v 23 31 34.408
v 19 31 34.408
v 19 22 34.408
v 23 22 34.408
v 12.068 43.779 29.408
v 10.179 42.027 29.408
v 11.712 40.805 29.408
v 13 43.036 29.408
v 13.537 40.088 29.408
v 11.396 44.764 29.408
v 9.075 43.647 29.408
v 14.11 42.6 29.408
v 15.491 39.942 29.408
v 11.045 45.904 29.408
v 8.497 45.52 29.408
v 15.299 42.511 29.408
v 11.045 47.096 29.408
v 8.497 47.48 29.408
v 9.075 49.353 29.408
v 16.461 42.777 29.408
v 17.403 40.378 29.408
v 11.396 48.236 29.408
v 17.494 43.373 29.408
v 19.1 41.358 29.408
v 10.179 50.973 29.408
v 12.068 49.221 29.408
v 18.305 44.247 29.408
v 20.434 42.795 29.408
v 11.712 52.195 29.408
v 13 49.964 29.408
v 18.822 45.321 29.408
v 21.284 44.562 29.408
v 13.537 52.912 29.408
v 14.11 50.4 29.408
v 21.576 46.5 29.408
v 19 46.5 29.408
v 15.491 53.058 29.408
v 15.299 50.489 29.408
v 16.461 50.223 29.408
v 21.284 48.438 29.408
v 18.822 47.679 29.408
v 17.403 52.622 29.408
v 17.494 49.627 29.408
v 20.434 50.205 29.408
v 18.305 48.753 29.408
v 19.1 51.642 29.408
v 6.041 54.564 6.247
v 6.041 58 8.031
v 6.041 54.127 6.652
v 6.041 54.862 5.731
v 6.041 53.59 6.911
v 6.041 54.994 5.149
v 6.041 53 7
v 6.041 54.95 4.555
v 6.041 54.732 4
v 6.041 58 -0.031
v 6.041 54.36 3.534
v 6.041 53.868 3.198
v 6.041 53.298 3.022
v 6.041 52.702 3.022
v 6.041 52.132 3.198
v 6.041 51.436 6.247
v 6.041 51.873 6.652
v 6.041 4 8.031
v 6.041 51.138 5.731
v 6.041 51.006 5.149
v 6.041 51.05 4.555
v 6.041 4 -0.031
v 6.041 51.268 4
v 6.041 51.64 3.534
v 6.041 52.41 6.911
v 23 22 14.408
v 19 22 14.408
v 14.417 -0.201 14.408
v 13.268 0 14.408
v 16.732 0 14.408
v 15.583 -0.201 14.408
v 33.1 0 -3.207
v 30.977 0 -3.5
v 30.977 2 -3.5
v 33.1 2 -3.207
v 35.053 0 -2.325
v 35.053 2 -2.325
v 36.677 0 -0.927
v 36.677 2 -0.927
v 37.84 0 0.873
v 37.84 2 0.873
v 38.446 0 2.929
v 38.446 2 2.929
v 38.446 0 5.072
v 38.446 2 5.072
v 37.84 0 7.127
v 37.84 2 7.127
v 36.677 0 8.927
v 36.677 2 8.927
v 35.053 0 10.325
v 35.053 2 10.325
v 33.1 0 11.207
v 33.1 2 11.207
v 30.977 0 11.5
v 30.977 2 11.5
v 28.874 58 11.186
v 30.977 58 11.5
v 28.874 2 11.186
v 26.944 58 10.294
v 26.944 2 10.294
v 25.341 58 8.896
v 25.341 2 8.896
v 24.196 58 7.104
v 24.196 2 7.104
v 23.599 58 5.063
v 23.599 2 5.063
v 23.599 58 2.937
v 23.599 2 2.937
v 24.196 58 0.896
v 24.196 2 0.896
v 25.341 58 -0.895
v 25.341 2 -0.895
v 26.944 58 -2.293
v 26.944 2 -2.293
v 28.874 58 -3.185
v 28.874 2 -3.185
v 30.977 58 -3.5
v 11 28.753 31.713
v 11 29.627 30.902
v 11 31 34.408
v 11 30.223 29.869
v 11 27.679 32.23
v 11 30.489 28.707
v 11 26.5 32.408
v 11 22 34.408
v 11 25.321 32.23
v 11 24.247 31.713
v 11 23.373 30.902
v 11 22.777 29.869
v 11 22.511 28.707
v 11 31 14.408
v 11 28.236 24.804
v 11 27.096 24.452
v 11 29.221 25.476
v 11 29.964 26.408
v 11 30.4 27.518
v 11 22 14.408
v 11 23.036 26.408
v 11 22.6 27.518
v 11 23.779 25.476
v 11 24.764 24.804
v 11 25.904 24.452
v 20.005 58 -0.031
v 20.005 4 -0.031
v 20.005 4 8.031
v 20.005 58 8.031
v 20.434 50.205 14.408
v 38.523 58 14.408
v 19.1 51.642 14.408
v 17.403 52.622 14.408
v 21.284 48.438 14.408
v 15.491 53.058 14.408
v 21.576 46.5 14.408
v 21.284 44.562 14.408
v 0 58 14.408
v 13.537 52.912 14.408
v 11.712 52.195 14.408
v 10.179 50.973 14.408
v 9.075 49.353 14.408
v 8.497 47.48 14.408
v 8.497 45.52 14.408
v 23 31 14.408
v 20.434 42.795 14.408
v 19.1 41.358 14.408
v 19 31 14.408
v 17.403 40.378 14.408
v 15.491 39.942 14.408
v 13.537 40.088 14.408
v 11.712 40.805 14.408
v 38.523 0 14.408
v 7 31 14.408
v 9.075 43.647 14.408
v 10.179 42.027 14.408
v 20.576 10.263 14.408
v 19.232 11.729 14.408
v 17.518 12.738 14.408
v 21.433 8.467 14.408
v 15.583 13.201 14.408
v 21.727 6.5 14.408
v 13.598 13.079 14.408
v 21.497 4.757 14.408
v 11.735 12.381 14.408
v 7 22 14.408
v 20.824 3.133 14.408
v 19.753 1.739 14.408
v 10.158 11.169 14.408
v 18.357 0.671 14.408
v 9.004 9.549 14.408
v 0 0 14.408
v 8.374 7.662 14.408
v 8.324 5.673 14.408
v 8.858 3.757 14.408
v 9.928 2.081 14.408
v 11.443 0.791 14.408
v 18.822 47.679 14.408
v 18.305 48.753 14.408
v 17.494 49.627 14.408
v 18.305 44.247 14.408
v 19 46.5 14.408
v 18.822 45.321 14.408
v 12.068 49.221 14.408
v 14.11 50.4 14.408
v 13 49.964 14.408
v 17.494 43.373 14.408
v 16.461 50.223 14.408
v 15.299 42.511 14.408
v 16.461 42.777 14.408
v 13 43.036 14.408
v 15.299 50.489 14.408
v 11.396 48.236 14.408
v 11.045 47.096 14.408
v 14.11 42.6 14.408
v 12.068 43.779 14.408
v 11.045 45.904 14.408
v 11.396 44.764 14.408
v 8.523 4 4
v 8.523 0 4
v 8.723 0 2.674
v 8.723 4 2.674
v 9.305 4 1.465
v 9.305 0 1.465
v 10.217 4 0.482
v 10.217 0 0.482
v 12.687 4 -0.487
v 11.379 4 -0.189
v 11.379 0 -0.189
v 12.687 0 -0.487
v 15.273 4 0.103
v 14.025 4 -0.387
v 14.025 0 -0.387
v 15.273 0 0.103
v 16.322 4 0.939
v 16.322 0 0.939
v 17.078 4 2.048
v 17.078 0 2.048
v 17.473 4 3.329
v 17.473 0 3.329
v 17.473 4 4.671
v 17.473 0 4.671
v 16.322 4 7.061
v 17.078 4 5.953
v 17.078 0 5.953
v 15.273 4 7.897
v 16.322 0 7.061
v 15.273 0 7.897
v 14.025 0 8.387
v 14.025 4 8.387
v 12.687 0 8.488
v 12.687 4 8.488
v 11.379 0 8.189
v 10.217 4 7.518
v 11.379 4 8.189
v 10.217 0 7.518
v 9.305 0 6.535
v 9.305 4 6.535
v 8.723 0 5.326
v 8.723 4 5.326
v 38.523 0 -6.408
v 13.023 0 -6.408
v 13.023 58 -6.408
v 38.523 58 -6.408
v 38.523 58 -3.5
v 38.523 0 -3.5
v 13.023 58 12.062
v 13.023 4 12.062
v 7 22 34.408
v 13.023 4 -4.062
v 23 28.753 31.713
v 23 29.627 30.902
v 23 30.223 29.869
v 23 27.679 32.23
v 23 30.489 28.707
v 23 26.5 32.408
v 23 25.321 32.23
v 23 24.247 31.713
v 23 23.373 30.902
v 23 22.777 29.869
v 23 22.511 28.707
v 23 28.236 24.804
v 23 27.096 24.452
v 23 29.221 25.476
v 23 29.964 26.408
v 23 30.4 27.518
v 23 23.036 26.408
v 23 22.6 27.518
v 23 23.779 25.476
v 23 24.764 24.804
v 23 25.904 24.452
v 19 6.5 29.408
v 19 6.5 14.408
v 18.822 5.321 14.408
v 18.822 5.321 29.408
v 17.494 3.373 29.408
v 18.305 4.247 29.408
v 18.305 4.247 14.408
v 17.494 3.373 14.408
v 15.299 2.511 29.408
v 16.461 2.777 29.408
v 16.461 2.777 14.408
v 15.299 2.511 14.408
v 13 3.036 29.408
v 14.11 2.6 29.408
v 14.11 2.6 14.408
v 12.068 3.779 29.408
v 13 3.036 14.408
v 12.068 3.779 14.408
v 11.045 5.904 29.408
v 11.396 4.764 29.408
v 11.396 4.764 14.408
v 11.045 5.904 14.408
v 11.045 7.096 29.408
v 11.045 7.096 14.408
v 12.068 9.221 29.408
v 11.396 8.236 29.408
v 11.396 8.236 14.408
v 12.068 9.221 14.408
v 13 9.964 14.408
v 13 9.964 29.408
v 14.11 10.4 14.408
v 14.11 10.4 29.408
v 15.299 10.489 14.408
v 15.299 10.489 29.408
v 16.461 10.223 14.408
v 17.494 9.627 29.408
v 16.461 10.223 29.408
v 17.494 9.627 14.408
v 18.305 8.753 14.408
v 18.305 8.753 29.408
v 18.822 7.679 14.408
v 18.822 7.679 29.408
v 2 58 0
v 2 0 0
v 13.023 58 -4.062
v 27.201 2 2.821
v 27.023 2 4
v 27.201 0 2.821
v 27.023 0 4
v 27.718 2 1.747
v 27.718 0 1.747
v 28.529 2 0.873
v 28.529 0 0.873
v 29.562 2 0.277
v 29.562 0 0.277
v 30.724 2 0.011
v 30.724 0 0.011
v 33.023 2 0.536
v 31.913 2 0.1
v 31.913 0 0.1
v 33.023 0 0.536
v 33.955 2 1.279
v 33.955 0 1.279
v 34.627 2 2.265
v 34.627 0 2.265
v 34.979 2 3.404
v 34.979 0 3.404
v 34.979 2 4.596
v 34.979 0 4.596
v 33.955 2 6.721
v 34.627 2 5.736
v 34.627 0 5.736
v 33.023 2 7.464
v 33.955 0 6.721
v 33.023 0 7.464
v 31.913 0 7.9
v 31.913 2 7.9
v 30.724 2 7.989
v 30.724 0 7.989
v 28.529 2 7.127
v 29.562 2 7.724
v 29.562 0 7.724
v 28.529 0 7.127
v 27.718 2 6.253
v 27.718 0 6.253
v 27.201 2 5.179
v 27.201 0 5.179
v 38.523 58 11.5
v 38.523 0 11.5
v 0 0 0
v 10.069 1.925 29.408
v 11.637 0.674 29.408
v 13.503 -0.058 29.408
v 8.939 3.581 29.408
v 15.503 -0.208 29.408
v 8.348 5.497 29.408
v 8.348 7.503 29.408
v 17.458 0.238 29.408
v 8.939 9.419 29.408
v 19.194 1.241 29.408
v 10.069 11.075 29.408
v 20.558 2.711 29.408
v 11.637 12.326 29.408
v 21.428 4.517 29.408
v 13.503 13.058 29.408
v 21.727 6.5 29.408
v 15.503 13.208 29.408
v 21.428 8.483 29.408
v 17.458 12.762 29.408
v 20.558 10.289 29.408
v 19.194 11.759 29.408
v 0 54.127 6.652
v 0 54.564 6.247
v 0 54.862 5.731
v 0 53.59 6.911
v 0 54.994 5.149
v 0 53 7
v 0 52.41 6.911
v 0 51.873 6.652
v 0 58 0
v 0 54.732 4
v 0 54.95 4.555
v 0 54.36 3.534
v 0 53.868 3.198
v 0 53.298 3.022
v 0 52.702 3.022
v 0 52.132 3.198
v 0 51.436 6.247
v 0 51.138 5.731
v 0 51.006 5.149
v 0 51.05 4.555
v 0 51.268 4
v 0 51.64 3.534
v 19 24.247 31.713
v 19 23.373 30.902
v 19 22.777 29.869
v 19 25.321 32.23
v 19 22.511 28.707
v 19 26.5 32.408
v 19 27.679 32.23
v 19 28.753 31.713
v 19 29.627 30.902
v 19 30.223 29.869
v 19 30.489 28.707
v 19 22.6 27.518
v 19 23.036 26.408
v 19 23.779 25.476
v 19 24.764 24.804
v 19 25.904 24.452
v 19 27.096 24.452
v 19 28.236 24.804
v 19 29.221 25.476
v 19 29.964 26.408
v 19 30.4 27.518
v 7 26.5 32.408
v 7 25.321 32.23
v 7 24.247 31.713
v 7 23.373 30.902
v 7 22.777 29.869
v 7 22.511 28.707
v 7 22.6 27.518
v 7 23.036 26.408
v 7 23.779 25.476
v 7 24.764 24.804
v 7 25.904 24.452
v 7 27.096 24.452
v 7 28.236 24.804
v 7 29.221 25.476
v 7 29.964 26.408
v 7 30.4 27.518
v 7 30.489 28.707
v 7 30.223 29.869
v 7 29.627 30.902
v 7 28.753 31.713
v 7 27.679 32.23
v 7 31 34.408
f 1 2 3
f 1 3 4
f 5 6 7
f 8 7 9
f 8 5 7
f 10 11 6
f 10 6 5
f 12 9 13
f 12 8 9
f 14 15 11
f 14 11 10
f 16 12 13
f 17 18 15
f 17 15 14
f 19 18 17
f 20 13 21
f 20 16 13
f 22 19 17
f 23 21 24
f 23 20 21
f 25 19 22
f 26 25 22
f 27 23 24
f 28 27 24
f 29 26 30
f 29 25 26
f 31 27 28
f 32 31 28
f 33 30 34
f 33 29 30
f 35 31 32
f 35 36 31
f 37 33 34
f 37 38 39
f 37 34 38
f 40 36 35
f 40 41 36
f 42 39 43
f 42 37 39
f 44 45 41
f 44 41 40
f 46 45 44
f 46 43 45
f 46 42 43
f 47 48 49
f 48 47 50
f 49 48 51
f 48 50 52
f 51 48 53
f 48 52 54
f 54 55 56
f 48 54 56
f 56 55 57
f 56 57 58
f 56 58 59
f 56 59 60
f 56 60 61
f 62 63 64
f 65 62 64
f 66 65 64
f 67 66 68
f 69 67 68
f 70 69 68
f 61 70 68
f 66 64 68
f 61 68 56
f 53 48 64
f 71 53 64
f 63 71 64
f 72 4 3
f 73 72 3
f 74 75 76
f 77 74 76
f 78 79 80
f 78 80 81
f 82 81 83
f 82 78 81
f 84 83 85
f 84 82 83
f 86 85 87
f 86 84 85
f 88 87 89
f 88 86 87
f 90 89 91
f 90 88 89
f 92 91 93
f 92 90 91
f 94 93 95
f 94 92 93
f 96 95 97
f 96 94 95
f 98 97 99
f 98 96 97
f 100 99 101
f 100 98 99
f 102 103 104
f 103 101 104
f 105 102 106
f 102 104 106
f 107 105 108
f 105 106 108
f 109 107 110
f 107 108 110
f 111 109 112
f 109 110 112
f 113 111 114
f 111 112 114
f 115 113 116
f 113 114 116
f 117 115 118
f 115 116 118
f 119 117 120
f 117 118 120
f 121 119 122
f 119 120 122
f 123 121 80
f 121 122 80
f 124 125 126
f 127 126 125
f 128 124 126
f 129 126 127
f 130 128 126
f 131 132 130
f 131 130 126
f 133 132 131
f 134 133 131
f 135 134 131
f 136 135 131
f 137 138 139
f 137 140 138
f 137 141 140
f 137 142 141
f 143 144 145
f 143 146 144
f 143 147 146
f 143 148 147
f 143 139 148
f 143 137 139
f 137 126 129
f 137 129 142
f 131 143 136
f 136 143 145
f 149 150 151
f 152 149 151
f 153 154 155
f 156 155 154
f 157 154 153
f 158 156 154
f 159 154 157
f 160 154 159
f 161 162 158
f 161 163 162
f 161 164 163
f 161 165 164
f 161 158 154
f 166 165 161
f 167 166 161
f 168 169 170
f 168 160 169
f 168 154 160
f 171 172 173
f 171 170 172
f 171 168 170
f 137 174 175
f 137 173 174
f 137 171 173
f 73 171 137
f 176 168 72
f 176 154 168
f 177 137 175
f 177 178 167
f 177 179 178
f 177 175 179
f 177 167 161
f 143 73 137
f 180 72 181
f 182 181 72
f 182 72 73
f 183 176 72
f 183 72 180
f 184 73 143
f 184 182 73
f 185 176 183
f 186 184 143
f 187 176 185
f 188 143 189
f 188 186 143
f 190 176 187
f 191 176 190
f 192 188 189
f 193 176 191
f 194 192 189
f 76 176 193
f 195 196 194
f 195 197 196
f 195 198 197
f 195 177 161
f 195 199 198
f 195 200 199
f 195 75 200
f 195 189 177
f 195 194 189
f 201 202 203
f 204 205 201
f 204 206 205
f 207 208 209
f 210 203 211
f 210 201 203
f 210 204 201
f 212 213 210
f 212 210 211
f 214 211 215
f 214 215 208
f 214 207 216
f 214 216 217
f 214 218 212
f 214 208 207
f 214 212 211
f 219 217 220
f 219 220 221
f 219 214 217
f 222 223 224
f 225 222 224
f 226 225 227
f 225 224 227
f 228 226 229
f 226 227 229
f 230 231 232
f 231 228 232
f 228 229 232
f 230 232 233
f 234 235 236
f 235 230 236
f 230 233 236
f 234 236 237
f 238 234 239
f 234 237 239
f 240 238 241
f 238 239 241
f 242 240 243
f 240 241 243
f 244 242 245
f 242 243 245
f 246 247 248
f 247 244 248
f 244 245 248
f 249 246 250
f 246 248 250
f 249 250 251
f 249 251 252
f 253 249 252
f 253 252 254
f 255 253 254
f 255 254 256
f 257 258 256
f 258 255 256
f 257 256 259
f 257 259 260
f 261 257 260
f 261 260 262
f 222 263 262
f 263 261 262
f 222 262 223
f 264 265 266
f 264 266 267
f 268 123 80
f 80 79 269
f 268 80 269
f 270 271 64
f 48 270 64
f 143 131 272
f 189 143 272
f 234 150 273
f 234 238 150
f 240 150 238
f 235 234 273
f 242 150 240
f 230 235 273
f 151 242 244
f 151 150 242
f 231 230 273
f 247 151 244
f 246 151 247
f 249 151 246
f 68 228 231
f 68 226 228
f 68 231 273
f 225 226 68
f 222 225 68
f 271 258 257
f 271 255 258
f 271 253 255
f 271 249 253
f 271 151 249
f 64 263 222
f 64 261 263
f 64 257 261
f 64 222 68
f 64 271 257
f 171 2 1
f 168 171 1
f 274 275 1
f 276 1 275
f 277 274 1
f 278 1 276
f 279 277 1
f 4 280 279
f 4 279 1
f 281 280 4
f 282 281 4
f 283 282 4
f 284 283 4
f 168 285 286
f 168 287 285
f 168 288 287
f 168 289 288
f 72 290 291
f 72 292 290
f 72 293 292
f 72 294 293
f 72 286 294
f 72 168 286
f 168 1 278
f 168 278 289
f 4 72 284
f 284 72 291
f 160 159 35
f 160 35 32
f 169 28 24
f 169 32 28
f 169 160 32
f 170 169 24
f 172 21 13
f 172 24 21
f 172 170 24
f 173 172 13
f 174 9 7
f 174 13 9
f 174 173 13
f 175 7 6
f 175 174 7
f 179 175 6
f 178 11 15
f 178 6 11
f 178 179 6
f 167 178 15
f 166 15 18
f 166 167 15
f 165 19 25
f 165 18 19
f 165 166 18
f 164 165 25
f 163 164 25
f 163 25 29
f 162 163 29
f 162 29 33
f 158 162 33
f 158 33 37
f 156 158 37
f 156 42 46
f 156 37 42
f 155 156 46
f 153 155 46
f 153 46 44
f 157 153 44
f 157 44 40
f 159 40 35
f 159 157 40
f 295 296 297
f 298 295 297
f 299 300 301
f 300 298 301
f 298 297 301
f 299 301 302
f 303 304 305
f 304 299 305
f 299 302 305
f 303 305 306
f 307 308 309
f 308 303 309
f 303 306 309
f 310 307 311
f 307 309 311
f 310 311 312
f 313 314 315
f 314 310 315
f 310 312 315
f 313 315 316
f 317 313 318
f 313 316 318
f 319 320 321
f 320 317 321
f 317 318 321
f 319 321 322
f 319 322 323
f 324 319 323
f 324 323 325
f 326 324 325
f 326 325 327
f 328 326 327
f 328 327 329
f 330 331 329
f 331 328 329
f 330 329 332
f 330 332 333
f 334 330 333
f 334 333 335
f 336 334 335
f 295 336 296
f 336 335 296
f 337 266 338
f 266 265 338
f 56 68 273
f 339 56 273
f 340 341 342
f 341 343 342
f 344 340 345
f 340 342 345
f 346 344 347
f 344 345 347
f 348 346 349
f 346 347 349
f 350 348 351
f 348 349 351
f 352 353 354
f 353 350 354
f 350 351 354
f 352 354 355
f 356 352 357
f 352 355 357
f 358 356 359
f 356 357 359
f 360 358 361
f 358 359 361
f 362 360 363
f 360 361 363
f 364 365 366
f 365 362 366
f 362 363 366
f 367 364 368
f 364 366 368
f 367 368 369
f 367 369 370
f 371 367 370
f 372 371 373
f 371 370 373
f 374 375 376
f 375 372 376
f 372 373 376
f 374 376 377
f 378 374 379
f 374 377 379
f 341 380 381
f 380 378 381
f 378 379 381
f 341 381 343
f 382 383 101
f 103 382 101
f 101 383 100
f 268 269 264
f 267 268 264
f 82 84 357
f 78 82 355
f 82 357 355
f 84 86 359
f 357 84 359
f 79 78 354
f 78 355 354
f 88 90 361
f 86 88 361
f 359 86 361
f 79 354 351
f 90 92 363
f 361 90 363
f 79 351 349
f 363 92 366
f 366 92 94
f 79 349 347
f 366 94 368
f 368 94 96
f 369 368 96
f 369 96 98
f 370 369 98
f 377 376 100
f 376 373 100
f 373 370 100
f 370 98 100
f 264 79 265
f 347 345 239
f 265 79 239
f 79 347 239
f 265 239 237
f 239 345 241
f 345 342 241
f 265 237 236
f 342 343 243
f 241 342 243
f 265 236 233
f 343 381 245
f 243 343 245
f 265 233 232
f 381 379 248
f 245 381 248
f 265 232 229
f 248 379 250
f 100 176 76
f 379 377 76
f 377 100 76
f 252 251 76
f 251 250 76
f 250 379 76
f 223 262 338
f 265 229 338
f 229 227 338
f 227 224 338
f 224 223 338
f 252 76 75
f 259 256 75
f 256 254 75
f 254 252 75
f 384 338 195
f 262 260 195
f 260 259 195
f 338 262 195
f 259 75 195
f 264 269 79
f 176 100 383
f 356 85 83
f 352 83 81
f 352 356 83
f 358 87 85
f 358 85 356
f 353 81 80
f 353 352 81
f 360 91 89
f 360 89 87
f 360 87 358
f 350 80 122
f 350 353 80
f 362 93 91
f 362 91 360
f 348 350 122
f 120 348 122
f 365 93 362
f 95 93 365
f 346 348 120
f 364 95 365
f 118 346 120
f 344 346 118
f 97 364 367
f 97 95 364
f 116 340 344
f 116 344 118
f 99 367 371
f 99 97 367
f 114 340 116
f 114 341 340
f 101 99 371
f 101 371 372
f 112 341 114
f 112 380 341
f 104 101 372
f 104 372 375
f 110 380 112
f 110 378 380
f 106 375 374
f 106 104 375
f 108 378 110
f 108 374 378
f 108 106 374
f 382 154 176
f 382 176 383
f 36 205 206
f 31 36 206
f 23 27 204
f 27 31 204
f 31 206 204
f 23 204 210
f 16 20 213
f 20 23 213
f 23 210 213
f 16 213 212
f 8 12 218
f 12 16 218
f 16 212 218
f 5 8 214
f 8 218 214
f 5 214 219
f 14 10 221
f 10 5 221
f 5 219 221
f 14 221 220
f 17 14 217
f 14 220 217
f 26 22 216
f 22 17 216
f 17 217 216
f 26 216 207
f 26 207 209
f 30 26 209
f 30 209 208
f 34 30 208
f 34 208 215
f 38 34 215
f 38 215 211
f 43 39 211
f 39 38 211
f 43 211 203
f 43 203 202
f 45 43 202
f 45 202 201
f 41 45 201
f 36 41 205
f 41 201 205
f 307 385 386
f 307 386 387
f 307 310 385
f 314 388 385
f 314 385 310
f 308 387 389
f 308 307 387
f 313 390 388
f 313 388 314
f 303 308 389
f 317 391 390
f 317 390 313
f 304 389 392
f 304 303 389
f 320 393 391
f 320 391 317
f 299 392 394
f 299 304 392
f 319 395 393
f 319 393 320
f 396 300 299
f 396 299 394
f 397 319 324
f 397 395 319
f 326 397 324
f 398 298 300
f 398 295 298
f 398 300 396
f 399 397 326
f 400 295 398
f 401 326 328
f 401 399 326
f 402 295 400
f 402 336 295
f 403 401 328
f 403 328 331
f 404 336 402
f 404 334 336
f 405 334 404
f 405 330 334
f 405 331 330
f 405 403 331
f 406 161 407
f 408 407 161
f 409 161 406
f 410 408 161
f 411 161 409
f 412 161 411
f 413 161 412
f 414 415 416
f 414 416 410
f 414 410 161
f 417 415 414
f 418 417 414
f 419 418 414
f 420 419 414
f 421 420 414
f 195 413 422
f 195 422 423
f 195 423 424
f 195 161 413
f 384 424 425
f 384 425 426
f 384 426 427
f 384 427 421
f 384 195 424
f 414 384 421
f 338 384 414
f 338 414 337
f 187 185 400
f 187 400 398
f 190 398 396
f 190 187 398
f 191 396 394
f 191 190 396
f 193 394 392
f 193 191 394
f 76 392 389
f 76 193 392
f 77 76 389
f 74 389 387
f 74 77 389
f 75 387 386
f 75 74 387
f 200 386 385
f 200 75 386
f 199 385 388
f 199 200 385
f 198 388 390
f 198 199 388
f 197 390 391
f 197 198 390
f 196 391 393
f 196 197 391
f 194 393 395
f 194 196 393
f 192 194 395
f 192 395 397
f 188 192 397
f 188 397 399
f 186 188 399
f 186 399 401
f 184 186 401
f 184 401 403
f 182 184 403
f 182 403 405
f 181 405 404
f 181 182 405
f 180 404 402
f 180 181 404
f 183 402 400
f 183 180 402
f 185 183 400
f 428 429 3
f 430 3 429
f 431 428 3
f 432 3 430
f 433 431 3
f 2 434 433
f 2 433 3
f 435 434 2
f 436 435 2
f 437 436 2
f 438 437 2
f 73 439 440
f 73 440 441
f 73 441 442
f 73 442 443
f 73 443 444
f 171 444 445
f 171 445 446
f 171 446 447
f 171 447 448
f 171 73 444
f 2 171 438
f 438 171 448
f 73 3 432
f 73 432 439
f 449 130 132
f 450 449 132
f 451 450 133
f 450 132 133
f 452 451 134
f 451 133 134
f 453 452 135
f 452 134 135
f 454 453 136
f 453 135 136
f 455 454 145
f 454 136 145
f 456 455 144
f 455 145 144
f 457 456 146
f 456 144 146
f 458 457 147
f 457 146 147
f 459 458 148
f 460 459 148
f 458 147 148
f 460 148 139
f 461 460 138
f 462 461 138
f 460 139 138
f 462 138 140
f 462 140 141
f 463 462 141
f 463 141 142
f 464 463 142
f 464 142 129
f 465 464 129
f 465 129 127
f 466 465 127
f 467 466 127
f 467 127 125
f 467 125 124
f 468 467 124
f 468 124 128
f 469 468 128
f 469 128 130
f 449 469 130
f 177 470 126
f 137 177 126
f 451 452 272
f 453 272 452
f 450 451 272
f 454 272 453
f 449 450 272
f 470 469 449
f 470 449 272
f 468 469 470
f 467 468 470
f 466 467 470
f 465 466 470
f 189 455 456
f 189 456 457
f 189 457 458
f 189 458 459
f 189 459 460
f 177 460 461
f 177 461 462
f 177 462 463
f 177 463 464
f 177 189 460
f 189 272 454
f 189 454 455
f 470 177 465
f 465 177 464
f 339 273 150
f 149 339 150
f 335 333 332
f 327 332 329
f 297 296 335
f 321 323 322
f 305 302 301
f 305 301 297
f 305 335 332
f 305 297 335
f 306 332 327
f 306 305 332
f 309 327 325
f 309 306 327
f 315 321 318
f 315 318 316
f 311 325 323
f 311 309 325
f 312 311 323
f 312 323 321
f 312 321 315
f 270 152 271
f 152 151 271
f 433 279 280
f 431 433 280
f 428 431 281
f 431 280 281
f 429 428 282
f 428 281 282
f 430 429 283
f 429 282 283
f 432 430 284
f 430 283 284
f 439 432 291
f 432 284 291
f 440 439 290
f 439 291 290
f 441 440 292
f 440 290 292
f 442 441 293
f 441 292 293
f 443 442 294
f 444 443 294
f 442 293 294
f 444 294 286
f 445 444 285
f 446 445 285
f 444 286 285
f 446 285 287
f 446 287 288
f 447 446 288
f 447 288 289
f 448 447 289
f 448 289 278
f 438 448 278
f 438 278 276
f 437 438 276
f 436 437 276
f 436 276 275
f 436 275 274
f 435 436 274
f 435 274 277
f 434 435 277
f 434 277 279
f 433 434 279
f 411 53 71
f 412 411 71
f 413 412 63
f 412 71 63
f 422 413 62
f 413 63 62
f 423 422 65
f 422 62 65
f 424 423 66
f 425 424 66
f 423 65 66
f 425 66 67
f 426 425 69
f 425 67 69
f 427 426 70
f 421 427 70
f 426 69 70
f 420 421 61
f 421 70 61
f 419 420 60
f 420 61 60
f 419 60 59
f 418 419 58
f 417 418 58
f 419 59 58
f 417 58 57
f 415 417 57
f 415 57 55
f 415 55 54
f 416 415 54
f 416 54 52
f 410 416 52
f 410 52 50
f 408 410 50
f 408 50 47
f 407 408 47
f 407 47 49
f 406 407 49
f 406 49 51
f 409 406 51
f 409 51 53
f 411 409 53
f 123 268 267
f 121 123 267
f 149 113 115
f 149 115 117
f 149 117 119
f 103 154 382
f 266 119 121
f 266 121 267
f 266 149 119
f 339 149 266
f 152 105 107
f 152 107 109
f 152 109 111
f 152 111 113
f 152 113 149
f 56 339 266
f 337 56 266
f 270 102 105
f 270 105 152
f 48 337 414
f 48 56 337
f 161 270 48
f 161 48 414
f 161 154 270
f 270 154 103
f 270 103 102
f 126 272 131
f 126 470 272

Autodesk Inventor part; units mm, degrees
ref_plane "YZ Plane" through (0, 0, 0) normal (1, 0, 0) x (0, 1, 0)
ref_plane "XZ Plane" through (0, 0, 0) normal (0, 1, 0) x (-1, 0, 0)
ref_plane "XY Plane" through (0, 0, 0) normal (0, 0, 1) x (1, 0, 0)
sketch "Sketch1" plane through (0, 0, 0) normal (0, 1, 0) x (-1, 0, 0)
  line L0 (-6.023191, 2.500092) -> (-6.023191, 5.500092) construction
  line L1 (-6.023191, 4.000092) -> (-13.023191, 4.000092) construction
  line L2 (-6.041071, 8.03122) -> (-6.041071, 4.000092)
  line L3 (-6.041071, -0.031037) -> (-13.023191, -4.062166)
  line L4 (-13.023191, -4.062166) -> (-20.005311, -0.031037)
  line L5 (-20.005311, -0.031037) -> (-20.005311, 8.03122)
  line L6 (-20.005311, 8.03122) -> (-13.023191, 12.062349)
  line L7 (-13.023191, 12.062349) -> (-6.041071, 8.03122)
  line L8 (-22.03646, 9.203905) -> (-22.03646, -1.203722)
  line L9 (-22.03646, -1.203722) -> (-13.023191, -6.407535)
  line L10 (-13.023191, 14.407718) -> (-22.03646, 9.203905)
  line L11 (-13.023191, 4.000092) -> (-31.023191, 4.000092) construction
  circle A0 centre (-31.023191, 4.000092) radius 7.5
  line L12 (-13.023191, -6.407535) -> (-30.97685, -6.407535)
  line L13 (-30.97685, -6.407535) -> (-30.97685, -3.499765)
  line L14 (-30.97685, 11.499948) -> (-30.97685, 14.407718)
  line L15 (-30.97685, 14.407718) -> (-13.023191, 14.407718)
  circle A1 centre (-13.023191, 4.000092) radius 4.5
  line L16 (-30.97685, 11.499988) -> (-30.97685, 14.407718)
  line L17 (-30.97685, -3.500012) -> (-30.97685, -6.407535)
  line L18 (-13.023191, -4.062166) -> (-13.023191, -6.407535)
  line L19 (-13.023191, 12.062349) -> (-13.023191, 14.407718)
  line L20 (-6.041071, 4.000092) -> (-6.041071, -0.031037)
  line L21 (-13.023191, 14.407718) -> (0, 14.407718)
  line L22 (0, 39) -> (0, 0)
  line L23 (0, 14.407718) -> (0, 8.03122)
  line L24 (0, 8.03122) -> (-6.041071, 8.03122)
  line L25 (0, 0) -> (-6, 0)
  line L26 (-13.023191, -6.407535) -> (-2, 0)
  line L27 (-2, 0) -> (-2, 8.03122)
  line L28 (-2, 0) -> (0, 0)
  line L29 (0, 8.03122) -> (0, 0)
  circle A2 centre (-31.023191, 4.000092) radius 4
  line L30 (-30.97685, -3.500012) -> (-38.523191, -3.500012)
  line L31 (-38.523191, -3.500012) -> (-38.523191, -6.407535)
  line L32 (-38.523191, -6.407535) -> (-30.97685, -6.407535)
  line L33 (-30.97685, -6.407535) -> (-30.97685, -3.500012)
  line L34 (-30.97685, 14.407718) -> (-38.523191, 14.407718)
  line L35 (-38.523191, 14.407718) -> (-38.523191, 11.499988)
  line L36 (-38.523191, 11.499988) -> (-30.97685, 11.499988)
  line L37 (-30.97685, 11.499988) -> (-30.97685, 14.407718)
  line L38 (0, 26) -> (-15, 26) construction
  point P0 (0, 31)
  dimension "d0" = 7
  dimension "d1" = 18
  dimension "d2" = 15
  dimension "d3" = 9
  dimension "d4" = 8
  dimension "d6" = 15
extrude "Extrusion1" add sketch "Sketch1" along normal blind 58 contours L24 L27 L26 L18 L3 L20 L2 | L7 L19 L21 L22 L24 | L6 L5 L4 L18 L9 L8 L10 L19 | L24 L22 L25 L27 | L10 L8 L9 L12 L13 A0 L14 L15 | L14 L36 L35 L34 | L32 L31 L30 L13
sketch "Sketch2" plane through (0, 0, 14.407718) normal (0, 0, 1) x (1, 0, 0)
  line L0 (0, 10) -> (15, 10) construction
  line L1 (0, 0) -> (38.523191, 0) construction
  line L2 (15, 0) -> (15, 6.5) construction
  line L3 (15, 0) -> (21.5, 0) construction
  circle A0 centre (15, 6.5) radius 4
  line L4 (15, 6.5) -> (15, 46.5) construction
  line L5 (23.523191, 58) -> (23.523191, 0) construction
  line L6 (15, 6.5) -> (55, 6.5) construction
  circle A1 centre (15, 46.5) radius 4
  circle A2 centre (15, 46.5) radius 6.576473
  circle A3 centre (15, 6.5) radius 6.726812
  line L7 (15, 46.5) -> (15, 26.5) construction
  line L8 (15, 46.5) -> (35, 46.5) construction
  line L9 (15, 26.5) -> (11, 26.5) construction
  line L10 (15, 26.5) -> (19, 26.5) construction
  line L11 (15, 26.5) -> (19, 26.5) construction
  line L12 (7, 31) -> (11, 31)
  line L13 (11, 31) -> (11, 22)
  line L14 (11, 22) -> (7, 22)
  line L15 (7, 22) -> (7, 31)
  line L16 (7, 31) -> (11, 22) construction
  line L17 (11, 31) -> (7, 22) construction
  line L18 (23, 22) -> (19, 22)
  line L19 (19, 22) -> (19, 31)
  line L20 (19, 31) -> (23, 31)
  line L21 (23, 31) -> (23, 22)
  line L22 (23, 22) -> (19, 31) construction
  line L23 (19, 22) -> (23, 31) construction
  point P0 (9, 26.5)
  point P1 (21, 26.5)
  dimension "d9" = 15
  dimension "d10" = 6.5
  dimension "d11" = 90
  dimension "d12" = 8
  dimension "d13" = 40
  dimension "d14" = 90
  dimension "d15" = 8
  dimension "d16" = 2.57647
  dimension "d17" = 2.72681
  dimension "d18" = 20
  dimension "d19" = 90
  dimension "d20" = 4
  dimension "d21" = 180
extrude "Extrusion2" add sketch "Sketch2" along normal blind 15 contours A2 | A3
extrude "Extrusion3" add sketch "Sketch2" along normal blind 20 contours L12 L13 L14 L15 | L18 L19 L20 L21
hole "Hole1" at (7, 26.5, 28.407718) direction (1, 0, 0) diameter 8 end through all
extrude "Extrusion4" add sketch "Sketch1" along normal blind 4 contours L2 L20 L3 L4 L5 L6 L7
hole "Hole2" at (0, 53, 5) direction (1, 0, 0) diameter 4 end up to surface
sketch "Sketch1 outline for Extrusion5" plane through (0, 0, 0) normal (0, 1, 0) x (-1, 0, 0)
  arc A0 (-30.97685, 11.499948) -> (-30.97685, -3.499765) centre (-31.023191, 4.000092) ccw
  arc A1 (-30.97685, -3.499765) -> (-30.97685, 11.499948) centre (-31.023191, 4.000092) ccw
  circle A2 centre (-31.023191, 4.000092) radius 4
extrude "Extrusion5" add sketch "Sketch1 outline for Extrusion5" along normal blind 2
properties part number "XMountR"
